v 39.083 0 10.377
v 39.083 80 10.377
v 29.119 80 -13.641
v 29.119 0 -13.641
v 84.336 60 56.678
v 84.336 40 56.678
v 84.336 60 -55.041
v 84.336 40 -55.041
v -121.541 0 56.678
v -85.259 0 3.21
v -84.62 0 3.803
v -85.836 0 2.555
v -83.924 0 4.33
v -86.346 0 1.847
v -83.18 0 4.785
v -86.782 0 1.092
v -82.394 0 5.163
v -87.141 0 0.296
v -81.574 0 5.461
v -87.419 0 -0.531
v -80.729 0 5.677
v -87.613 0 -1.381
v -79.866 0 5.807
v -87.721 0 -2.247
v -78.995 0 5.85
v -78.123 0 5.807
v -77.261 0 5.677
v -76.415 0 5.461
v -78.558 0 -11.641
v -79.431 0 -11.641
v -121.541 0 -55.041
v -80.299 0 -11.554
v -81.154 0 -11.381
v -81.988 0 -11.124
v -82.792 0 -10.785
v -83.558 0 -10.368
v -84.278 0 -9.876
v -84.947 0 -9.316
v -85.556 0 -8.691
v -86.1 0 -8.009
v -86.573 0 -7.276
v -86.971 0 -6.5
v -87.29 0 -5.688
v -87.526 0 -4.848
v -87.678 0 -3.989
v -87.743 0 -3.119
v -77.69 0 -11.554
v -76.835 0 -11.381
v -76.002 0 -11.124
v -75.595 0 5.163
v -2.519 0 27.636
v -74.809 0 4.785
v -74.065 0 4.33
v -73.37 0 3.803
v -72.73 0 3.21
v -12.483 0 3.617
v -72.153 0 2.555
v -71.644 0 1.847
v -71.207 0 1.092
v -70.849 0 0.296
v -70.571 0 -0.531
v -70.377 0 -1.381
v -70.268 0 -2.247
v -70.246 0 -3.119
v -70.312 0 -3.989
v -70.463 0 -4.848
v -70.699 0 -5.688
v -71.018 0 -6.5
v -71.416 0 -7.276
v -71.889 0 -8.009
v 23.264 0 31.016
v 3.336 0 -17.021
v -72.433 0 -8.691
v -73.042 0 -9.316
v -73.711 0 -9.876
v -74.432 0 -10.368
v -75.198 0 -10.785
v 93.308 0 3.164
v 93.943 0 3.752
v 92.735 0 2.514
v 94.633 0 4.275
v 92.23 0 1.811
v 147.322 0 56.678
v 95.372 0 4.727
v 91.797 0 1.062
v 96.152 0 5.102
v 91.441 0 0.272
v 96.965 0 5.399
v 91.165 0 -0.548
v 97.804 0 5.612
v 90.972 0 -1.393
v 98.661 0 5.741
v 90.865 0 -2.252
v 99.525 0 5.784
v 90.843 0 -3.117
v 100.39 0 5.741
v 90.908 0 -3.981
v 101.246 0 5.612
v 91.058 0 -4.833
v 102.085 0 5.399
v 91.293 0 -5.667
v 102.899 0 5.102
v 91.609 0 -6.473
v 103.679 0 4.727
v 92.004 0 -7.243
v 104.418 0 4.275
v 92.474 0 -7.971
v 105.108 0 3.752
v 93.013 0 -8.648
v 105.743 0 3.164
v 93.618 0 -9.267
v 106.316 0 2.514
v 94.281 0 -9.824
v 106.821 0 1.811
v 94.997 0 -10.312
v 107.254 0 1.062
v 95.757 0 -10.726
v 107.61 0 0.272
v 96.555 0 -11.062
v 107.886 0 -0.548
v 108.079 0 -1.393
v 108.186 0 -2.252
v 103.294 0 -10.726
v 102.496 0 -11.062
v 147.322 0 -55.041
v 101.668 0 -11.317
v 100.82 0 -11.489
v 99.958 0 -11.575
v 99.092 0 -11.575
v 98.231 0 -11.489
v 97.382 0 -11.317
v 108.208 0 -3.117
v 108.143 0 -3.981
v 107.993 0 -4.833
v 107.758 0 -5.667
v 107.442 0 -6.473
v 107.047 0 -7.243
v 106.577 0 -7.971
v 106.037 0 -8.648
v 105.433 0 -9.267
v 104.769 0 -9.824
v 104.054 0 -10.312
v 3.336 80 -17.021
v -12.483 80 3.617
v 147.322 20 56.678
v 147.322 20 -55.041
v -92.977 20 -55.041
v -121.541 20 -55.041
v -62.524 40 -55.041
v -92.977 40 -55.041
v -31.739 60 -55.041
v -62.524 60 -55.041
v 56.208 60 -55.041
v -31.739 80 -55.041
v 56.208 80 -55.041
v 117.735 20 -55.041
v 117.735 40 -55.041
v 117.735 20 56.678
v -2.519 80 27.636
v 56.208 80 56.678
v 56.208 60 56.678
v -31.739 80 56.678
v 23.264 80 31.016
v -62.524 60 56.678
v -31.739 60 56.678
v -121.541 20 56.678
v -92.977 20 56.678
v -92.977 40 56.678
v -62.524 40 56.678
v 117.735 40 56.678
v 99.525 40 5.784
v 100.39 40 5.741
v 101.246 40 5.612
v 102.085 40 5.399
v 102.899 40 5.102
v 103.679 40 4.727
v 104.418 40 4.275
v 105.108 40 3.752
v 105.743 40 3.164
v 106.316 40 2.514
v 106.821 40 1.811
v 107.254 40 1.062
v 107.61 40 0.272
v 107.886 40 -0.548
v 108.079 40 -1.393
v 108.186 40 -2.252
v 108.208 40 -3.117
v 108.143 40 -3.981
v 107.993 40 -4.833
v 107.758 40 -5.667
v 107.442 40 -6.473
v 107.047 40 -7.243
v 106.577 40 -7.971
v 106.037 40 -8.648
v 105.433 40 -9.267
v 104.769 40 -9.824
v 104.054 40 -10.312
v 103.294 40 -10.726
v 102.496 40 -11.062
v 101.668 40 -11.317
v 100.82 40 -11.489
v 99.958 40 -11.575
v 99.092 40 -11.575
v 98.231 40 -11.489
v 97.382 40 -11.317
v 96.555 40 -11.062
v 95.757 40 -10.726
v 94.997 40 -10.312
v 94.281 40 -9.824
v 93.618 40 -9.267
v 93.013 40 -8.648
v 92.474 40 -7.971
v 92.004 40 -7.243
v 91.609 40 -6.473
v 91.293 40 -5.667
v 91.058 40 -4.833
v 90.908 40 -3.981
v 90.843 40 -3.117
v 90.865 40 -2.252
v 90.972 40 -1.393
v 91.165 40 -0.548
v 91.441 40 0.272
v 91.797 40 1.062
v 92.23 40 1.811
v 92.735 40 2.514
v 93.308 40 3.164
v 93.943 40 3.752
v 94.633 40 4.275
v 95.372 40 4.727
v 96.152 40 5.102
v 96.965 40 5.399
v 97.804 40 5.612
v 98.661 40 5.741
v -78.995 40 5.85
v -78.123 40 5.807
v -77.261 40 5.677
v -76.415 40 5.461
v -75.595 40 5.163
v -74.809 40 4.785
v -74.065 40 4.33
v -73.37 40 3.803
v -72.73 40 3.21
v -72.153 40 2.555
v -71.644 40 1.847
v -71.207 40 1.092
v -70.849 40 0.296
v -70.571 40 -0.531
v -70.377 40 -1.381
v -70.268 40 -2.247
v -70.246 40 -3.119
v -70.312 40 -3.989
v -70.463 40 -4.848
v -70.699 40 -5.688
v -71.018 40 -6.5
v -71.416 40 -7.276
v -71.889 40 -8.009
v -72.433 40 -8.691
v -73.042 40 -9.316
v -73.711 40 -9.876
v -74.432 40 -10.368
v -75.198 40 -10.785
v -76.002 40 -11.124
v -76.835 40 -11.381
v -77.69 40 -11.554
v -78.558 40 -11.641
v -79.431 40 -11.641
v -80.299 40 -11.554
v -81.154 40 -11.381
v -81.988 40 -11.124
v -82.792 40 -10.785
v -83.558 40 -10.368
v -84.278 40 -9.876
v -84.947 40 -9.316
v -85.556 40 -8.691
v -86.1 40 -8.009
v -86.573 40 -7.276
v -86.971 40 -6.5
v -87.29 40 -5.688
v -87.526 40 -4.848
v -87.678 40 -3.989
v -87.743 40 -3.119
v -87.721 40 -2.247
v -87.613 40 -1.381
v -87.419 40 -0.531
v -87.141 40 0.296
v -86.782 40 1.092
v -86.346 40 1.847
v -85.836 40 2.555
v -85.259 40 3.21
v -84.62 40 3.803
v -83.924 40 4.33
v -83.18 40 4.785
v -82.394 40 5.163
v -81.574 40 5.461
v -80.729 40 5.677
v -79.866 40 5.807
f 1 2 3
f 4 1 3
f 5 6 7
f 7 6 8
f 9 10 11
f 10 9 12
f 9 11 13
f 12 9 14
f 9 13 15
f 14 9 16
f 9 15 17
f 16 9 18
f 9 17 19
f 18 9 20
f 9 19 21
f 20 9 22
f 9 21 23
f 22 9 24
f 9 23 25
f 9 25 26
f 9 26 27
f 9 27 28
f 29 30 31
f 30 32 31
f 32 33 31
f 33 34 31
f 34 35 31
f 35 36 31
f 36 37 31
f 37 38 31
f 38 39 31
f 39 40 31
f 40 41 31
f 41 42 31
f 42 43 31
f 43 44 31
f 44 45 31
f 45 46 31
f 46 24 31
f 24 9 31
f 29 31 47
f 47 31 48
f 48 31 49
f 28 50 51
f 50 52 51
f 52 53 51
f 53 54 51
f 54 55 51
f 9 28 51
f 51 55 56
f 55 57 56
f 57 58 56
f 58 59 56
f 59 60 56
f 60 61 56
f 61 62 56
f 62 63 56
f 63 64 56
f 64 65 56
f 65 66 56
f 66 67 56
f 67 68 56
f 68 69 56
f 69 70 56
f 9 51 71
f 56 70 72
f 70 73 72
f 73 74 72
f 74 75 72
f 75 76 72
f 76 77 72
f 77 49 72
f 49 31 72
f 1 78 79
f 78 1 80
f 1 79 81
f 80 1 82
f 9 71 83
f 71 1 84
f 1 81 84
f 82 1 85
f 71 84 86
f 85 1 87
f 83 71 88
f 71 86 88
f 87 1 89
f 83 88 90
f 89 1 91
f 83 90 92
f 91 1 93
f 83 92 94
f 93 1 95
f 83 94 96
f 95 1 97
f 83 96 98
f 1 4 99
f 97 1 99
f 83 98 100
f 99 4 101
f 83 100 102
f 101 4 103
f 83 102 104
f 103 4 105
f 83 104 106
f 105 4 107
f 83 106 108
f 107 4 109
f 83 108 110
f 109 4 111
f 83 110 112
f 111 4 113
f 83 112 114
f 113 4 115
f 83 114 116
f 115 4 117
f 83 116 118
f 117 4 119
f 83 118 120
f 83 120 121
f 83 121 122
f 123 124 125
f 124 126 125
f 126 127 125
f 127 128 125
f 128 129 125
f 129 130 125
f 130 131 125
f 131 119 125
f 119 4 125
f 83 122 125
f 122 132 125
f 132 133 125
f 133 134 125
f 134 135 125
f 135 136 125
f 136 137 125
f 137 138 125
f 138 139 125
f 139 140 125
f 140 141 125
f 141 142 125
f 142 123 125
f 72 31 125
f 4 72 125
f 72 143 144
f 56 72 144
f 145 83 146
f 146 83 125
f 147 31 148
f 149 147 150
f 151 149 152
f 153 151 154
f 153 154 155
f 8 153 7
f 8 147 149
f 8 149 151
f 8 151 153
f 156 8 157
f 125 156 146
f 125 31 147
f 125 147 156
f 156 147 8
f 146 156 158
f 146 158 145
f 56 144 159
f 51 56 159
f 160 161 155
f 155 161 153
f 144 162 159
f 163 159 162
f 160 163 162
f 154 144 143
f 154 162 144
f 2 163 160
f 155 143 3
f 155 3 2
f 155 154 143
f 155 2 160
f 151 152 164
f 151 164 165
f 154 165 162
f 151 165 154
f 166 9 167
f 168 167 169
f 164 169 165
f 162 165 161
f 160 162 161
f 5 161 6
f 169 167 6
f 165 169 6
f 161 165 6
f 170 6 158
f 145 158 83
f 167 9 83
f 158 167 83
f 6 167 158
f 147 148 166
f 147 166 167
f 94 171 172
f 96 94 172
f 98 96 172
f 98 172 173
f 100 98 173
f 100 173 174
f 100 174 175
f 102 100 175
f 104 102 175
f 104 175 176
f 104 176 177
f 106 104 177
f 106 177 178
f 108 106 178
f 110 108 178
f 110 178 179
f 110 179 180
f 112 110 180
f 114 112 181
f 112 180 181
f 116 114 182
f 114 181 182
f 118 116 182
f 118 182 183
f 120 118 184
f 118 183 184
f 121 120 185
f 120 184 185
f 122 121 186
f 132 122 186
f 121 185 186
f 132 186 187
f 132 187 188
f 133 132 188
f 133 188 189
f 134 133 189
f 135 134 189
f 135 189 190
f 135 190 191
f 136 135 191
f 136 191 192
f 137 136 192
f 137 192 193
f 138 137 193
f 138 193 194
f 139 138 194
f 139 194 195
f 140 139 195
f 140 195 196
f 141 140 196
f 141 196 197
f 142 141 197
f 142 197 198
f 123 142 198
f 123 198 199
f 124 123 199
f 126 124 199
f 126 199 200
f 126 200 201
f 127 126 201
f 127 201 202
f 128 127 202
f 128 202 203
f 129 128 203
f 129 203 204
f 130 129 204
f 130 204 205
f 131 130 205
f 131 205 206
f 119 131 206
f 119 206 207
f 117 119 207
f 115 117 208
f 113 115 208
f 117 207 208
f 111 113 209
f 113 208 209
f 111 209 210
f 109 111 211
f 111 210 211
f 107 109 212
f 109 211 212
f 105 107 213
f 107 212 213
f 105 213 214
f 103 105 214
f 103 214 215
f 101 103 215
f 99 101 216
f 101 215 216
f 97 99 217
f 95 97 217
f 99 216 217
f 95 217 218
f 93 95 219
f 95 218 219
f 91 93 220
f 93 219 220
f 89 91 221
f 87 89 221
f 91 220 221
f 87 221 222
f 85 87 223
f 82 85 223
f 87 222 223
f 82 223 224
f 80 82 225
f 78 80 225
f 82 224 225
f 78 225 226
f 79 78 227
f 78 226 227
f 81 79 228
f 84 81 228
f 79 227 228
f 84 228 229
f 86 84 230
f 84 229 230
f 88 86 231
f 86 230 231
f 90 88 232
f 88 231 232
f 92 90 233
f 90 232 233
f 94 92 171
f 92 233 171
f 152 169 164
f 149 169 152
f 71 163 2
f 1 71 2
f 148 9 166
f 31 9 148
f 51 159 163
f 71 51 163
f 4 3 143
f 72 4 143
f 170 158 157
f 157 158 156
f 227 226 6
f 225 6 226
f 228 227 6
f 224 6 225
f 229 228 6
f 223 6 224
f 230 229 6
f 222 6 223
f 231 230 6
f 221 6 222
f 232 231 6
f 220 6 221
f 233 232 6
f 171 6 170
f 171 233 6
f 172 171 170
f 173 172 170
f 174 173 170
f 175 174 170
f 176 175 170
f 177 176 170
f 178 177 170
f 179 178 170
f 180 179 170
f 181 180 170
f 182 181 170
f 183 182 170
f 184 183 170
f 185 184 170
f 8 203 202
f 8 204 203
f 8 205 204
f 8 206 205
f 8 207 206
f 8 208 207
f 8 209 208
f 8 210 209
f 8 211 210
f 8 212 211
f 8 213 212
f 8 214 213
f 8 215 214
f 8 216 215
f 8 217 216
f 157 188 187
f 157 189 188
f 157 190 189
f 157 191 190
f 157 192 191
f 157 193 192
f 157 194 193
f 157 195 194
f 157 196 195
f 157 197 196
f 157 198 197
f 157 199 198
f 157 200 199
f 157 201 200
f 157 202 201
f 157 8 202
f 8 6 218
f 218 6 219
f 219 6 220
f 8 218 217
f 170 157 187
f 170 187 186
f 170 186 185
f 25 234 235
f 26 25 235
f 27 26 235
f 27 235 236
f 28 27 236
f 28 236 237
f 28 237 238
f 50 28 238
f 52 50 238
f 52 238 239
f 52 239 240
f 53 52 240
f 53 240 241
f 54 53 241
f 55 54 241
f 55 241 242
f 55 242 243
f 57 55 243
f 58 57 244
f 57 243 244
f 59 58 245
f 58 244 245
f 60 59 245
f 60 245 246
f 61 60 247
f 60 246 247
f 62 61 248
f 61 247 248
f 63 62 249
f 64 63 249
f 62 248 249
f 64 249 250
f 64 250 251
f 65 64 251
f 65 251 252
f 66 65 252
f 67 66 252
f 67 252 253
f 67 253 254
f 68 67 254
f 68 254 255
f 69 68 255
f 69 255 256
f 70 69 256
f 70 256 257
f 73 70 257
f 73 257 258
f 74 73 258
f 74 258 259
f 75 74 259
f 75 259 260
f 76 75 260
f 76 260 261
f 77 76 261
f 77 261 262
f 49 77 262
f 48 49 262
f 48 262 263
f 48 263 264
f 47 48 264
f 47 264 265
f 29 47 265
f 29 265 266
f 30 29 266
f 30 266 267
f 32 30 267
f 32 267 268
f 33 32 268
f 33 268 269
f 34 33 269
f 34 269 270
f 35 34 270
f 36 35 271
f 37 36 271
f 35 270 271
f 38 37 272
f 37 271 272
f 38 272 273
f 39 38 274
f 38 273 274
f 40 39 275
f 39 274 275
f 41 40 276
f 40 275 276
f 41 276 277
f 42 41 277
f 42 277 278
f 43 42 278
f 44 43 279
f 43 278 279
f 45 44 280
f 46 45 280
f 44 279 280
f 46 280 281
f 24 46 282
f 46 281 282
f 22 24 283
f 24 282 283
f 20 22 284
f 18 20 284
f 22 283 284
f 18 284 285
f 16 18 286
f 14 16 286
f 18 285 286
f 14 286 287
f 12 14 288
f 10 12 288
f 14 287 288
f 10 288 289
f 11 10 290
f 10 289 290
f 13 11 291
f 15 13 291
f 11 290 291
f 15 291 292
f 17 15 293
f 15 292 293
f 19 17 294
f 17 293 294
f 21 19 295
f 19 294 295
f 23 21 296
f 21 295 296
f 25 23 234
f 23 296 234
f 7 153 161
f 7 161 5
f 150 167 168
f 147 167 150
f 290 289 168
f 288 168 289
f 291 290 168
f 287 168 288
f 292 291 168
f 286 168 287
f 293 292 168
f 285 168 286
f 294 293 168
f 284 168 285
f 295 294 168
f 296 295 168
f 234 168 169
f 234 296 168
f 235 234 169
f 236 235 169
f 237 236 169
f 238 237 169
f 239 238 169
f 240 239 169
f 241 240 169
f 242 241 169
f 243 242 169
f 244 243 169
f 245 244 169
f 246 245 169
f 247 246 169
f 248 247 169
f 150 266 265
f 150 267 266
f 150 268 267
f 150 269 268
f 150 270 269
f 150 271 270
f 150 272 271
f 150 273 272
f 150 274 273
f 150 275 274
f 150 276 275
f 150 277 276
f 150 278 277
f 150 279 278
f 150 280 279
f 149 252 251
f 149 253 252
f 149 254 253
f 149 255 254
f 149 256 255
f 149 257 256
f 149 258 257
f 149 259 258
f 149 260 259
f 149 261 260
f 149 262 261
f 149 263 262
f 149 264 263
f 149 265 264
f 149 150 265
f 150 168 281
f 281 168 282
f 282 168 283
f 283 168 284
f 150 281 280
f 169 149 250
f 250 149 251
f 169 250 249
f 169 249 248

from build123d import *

# Parameters (mm, degrees)
SKETCH1_W           = 268.862640616
SKETCH1_H           = 111.719179434
BOSS_EXTRUDE1_DEPTH = 20
SKETCH2_W           = 210.712226585
SKETCH2_H           = 111.719179434
BOSS_EXTRUDE2_DEPTH = 20
SKETCH3_W           = 146.860036711
SKETCH3_H           = 111.719179434
BOSS_EXTRUDE3_DEPTH = 20
SKETCH5_W           = 87.947337462
SKETCH5_H           = 111.719179434
BOSS_EXTRUDE5_DEPTH = 20
SKETCH9_R           = 8.750978852
SKETCH9_R_2         = 8.685098526
CUT_EXTRUDE3_DEPTH  = 163.837867161
CUT_EXTRUDE4_DEPTH  = 177.963756124


with BuildPart() as part:
    # Sketch1 → Boss-Extrude1 (new body)
    with BuildSketch(Plane(origin=(0, 0, 0), x_dir=(1, 0, 0), z_dir=(0, 1, 0))):
        with Locations((12.89067455, -0.818455527)):
            Rectangle(SKETCH1_W, SKETCH1_H)
    extrude(amount=BOSS_EXTRUDE1_DEPTH)

    # Sketch2 → Boss-Extrude2 (add)
    with BuildSketch(Plane(origin=(0, 20, 0), x_dir=(1, 0, 0), z_dir=(0, 1, 0))):
        with Locations((12.379125057, -0.818455527)):
            Rectangle(SKETCH2_W, SKETCH2_H)
    extrude(amount=BOSS_EXTRUDE2_DEPTH)

    # Sketch3 → Boss-Extrude3 (add)
    with BuildSketch(Plane(origin=(0, 40, 0), x_dir=(1, 0, 0), z_dir=(0, 1, 0))):
        with Locations((10.905612982, -0.818455527)):
            Rectangle(SKETCH3_W, SKETCH3_H)
    extrude(amount=BOSS_EXTRUDE3_DEPTH)

    # Sketch5 → Boss-Extrude5 (add)
    with BuildSketch(Plane(origin=(0, 60, 0), x_dir=(1, 0, 0), z_dir=(0, 1, 0))):
        with Locations((12.234351136, -0.818455527)):
            Rectangle(SKETCH5_W, SKETCH5_H)
    extrude(amount=BOSS_EXTRUDE5_DEPTH)

    # Sketch9 → Cut-Extrude3 (cut, through all)
    with BuildSketch(Plane(origin=(0, 40, 0), x_dir=(1, 0, 0), z_dir=(0, 1, 0))):
        with Locations(Location((-78.994603396, 2.900710485, 0), (0, 0, 270))):
            Circle(SKETCH9_R)
        with Locations(Location((99.525365185, 2.900710485, 0), (0, 0, 270))):
            Circle(SKETCH9_R_2)
    extrude(amount=-CUT_EXTRUDE3_DEPTH, mode=Mode.SUBTRACT)

    # Sketch10 → Cut-Extrude4 (cut, through all)
    with BuildSketch(Plane(origin=(0, 80, 0), x_dir=(1, 0, 0), z_dir=(0, 1, 0))):
        Polygon((23.264076608, -31.015956355), (39.082685924, -10.377494547), (29.11855836, 13.641053878), (3.335821481, 17.021140493), (-12.482787835, -3.617321315), (-2.518660272, -27.63586974), align=None)
    extrude(amount=-CUT_EXTRUDE4_DEPTH, mode=Mode.SUBTRACT)


solid = part.part
